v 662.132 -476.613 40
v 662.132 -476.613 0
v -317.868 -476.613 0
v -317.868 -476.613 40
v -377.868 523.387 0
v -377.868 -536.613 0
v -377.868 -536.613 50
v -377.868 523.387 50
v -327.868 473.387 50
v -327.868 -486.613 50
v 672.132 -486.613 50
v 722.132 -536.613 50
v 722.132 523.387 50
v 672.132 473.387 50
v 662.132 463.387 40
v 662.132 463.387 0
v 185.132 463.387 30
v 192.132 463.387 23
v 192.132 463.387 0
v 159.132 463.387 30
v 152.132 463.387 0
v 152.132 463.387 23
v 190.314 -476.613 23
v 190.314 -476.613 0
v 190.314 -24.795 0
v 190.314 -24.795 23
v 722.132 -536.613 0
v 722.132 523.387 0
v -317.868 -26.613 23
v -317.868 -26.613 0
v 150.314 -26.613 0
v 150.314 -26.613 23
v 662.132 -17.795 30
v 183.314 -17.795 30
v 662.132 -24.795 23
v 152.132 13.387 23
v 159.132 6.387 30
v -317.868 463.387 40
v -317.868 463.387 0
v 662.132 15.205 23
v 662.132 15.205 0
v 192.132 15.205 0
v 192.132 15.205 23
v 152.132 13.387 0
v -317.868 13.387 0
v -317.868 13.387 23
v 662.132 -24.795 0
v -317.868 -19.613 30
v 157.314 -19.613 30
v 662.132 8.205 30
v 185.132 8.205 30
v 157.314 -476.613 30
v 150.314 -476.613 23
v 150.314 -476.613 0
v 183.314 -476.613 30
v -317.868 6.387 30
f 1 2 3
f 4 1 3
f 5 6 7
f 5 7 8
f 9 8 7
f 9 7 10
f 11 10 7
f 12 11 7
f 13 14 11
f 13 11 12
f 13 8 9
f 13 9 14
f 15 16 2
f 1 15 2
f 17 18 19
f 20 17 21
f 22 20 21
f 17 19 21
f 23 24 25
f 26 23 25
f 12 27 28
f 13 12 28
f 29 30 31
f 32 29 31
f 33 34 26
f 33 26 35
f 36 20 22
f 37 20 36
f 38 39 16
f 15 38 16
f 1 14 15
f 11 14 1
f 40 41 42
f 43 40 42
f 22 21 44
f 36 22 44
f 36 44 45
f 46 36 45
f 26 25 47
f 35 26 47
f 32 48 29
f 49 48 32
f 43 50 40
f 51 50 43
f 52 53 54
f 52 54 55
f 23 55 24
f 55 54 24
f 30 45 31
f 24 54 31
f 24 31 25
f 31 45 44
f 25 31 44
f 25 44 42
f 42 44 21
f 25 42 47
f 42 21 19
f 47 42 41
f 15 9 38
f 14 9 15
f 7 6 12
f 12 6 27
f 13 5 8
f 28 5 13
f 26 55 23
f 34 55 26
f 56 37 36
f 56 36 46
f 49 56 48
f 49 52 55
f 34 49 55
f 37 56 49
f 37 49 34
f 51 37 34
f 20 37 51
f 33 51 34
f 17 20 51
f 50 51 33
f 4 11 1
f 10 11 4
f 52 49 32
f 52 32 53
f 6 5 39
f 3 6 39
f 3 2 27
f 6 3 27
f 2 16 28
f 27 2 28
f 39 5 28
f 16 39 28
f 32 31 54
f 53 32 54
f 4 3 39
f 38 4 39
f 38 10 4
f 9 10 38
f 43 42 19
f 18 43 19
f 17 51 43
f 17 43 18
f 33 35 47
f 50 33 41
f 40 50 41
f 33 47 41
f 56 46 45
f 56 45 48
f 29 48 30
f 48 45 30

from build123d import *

# Parameters (mm, degrees)
F0_W     = 1100
F0_H     = 1060
F1_DEPTH = 50
F2_SIZE  = 10
F3_DEPTH = 30
F4_SIZE  = 7


# Not quite as in the source:
# - a feature names something its author has since deleted; it is built from what else it names


with BuildPart() as f1:
    # F0 (on Top) → F1 (new body)
    with BuildSketch(Plane.XY):
        with Locations((172.132343931, -6.6134499709)):
            Rectangle(F0_W, F0_H)
        Polygon((-317.867656069, 13.3865500291), (-317.867656069, 463.3865500291), (152.132343931, 463.3865500291), (192.132343931, 463.3865500291), (662.132343931, 463.3865500291), (662.132343931, 15.2047318473), (662.132343931, -24.7952681527), (662.132343931, -476.6134499709), (190.3141621128, -476.6134499709), (150.3141621128, -476.6134499709), (-317.867656069, -476.6134499709), (-317.867656069, -26.6134499709), align=None, mode=Mode.SUBTRACT)
    extrude(amount=F1_DEPTH)

    # F2
    f2_edges = [f1.edges().sort_by_distance(p)[0] for p in [
        (-317.867656, -6.61345, 50),
        (172.132344, 463.38655, 50),
        (662.132344, -6.61345, 50),
        (172.132344, -476.61345, 50),
    ]]
    chamfer(f2_edges, length=F2_SIZE)


with BuildPart() as f3:
    # F0 (on Top) → F3 (new body)
    with BuildSketch(Plane.XY):
        Polygon((192.132343931, 463.3865500291), (152.132343931, 463.3865500291), (152.132343931, 13.3865500291), (-317.867656069, 13.3865500291), (-317.867656069, -26.6134499709), (150.3141621128, -26.6134499709), (150.3141621128, -476.6134499709), (190.3141621128, -476.6134499709), (190.3141621128, -24.7952681527), (662.132343931, -24.7952681527), (662.132343931, 15.2047318473), (192.132343931, 15.2047318473), align=None)
    extrude(amount=F3_DEPTH)

    # F4
    f4_edges = [f3.edges().sort_by_distance(p)[0] for p in [
        (-83.776747, -26.61345, 30),
        (-82.867656, 13.38655, 30),
        (152.132344, 238.38655, 30),
        (192.132344, 239.295641, 30),
        (426.223253, -24.795268, 30),
        (427.132344, 15.204732, 30),
        (190.314162, -250.704359, 30),
        (150.314162, -251.61345, 30),
    ]]
    chamfer(f4_edges, length=F4_SIZE)


solid = Compound([f1.part, f3.part])
